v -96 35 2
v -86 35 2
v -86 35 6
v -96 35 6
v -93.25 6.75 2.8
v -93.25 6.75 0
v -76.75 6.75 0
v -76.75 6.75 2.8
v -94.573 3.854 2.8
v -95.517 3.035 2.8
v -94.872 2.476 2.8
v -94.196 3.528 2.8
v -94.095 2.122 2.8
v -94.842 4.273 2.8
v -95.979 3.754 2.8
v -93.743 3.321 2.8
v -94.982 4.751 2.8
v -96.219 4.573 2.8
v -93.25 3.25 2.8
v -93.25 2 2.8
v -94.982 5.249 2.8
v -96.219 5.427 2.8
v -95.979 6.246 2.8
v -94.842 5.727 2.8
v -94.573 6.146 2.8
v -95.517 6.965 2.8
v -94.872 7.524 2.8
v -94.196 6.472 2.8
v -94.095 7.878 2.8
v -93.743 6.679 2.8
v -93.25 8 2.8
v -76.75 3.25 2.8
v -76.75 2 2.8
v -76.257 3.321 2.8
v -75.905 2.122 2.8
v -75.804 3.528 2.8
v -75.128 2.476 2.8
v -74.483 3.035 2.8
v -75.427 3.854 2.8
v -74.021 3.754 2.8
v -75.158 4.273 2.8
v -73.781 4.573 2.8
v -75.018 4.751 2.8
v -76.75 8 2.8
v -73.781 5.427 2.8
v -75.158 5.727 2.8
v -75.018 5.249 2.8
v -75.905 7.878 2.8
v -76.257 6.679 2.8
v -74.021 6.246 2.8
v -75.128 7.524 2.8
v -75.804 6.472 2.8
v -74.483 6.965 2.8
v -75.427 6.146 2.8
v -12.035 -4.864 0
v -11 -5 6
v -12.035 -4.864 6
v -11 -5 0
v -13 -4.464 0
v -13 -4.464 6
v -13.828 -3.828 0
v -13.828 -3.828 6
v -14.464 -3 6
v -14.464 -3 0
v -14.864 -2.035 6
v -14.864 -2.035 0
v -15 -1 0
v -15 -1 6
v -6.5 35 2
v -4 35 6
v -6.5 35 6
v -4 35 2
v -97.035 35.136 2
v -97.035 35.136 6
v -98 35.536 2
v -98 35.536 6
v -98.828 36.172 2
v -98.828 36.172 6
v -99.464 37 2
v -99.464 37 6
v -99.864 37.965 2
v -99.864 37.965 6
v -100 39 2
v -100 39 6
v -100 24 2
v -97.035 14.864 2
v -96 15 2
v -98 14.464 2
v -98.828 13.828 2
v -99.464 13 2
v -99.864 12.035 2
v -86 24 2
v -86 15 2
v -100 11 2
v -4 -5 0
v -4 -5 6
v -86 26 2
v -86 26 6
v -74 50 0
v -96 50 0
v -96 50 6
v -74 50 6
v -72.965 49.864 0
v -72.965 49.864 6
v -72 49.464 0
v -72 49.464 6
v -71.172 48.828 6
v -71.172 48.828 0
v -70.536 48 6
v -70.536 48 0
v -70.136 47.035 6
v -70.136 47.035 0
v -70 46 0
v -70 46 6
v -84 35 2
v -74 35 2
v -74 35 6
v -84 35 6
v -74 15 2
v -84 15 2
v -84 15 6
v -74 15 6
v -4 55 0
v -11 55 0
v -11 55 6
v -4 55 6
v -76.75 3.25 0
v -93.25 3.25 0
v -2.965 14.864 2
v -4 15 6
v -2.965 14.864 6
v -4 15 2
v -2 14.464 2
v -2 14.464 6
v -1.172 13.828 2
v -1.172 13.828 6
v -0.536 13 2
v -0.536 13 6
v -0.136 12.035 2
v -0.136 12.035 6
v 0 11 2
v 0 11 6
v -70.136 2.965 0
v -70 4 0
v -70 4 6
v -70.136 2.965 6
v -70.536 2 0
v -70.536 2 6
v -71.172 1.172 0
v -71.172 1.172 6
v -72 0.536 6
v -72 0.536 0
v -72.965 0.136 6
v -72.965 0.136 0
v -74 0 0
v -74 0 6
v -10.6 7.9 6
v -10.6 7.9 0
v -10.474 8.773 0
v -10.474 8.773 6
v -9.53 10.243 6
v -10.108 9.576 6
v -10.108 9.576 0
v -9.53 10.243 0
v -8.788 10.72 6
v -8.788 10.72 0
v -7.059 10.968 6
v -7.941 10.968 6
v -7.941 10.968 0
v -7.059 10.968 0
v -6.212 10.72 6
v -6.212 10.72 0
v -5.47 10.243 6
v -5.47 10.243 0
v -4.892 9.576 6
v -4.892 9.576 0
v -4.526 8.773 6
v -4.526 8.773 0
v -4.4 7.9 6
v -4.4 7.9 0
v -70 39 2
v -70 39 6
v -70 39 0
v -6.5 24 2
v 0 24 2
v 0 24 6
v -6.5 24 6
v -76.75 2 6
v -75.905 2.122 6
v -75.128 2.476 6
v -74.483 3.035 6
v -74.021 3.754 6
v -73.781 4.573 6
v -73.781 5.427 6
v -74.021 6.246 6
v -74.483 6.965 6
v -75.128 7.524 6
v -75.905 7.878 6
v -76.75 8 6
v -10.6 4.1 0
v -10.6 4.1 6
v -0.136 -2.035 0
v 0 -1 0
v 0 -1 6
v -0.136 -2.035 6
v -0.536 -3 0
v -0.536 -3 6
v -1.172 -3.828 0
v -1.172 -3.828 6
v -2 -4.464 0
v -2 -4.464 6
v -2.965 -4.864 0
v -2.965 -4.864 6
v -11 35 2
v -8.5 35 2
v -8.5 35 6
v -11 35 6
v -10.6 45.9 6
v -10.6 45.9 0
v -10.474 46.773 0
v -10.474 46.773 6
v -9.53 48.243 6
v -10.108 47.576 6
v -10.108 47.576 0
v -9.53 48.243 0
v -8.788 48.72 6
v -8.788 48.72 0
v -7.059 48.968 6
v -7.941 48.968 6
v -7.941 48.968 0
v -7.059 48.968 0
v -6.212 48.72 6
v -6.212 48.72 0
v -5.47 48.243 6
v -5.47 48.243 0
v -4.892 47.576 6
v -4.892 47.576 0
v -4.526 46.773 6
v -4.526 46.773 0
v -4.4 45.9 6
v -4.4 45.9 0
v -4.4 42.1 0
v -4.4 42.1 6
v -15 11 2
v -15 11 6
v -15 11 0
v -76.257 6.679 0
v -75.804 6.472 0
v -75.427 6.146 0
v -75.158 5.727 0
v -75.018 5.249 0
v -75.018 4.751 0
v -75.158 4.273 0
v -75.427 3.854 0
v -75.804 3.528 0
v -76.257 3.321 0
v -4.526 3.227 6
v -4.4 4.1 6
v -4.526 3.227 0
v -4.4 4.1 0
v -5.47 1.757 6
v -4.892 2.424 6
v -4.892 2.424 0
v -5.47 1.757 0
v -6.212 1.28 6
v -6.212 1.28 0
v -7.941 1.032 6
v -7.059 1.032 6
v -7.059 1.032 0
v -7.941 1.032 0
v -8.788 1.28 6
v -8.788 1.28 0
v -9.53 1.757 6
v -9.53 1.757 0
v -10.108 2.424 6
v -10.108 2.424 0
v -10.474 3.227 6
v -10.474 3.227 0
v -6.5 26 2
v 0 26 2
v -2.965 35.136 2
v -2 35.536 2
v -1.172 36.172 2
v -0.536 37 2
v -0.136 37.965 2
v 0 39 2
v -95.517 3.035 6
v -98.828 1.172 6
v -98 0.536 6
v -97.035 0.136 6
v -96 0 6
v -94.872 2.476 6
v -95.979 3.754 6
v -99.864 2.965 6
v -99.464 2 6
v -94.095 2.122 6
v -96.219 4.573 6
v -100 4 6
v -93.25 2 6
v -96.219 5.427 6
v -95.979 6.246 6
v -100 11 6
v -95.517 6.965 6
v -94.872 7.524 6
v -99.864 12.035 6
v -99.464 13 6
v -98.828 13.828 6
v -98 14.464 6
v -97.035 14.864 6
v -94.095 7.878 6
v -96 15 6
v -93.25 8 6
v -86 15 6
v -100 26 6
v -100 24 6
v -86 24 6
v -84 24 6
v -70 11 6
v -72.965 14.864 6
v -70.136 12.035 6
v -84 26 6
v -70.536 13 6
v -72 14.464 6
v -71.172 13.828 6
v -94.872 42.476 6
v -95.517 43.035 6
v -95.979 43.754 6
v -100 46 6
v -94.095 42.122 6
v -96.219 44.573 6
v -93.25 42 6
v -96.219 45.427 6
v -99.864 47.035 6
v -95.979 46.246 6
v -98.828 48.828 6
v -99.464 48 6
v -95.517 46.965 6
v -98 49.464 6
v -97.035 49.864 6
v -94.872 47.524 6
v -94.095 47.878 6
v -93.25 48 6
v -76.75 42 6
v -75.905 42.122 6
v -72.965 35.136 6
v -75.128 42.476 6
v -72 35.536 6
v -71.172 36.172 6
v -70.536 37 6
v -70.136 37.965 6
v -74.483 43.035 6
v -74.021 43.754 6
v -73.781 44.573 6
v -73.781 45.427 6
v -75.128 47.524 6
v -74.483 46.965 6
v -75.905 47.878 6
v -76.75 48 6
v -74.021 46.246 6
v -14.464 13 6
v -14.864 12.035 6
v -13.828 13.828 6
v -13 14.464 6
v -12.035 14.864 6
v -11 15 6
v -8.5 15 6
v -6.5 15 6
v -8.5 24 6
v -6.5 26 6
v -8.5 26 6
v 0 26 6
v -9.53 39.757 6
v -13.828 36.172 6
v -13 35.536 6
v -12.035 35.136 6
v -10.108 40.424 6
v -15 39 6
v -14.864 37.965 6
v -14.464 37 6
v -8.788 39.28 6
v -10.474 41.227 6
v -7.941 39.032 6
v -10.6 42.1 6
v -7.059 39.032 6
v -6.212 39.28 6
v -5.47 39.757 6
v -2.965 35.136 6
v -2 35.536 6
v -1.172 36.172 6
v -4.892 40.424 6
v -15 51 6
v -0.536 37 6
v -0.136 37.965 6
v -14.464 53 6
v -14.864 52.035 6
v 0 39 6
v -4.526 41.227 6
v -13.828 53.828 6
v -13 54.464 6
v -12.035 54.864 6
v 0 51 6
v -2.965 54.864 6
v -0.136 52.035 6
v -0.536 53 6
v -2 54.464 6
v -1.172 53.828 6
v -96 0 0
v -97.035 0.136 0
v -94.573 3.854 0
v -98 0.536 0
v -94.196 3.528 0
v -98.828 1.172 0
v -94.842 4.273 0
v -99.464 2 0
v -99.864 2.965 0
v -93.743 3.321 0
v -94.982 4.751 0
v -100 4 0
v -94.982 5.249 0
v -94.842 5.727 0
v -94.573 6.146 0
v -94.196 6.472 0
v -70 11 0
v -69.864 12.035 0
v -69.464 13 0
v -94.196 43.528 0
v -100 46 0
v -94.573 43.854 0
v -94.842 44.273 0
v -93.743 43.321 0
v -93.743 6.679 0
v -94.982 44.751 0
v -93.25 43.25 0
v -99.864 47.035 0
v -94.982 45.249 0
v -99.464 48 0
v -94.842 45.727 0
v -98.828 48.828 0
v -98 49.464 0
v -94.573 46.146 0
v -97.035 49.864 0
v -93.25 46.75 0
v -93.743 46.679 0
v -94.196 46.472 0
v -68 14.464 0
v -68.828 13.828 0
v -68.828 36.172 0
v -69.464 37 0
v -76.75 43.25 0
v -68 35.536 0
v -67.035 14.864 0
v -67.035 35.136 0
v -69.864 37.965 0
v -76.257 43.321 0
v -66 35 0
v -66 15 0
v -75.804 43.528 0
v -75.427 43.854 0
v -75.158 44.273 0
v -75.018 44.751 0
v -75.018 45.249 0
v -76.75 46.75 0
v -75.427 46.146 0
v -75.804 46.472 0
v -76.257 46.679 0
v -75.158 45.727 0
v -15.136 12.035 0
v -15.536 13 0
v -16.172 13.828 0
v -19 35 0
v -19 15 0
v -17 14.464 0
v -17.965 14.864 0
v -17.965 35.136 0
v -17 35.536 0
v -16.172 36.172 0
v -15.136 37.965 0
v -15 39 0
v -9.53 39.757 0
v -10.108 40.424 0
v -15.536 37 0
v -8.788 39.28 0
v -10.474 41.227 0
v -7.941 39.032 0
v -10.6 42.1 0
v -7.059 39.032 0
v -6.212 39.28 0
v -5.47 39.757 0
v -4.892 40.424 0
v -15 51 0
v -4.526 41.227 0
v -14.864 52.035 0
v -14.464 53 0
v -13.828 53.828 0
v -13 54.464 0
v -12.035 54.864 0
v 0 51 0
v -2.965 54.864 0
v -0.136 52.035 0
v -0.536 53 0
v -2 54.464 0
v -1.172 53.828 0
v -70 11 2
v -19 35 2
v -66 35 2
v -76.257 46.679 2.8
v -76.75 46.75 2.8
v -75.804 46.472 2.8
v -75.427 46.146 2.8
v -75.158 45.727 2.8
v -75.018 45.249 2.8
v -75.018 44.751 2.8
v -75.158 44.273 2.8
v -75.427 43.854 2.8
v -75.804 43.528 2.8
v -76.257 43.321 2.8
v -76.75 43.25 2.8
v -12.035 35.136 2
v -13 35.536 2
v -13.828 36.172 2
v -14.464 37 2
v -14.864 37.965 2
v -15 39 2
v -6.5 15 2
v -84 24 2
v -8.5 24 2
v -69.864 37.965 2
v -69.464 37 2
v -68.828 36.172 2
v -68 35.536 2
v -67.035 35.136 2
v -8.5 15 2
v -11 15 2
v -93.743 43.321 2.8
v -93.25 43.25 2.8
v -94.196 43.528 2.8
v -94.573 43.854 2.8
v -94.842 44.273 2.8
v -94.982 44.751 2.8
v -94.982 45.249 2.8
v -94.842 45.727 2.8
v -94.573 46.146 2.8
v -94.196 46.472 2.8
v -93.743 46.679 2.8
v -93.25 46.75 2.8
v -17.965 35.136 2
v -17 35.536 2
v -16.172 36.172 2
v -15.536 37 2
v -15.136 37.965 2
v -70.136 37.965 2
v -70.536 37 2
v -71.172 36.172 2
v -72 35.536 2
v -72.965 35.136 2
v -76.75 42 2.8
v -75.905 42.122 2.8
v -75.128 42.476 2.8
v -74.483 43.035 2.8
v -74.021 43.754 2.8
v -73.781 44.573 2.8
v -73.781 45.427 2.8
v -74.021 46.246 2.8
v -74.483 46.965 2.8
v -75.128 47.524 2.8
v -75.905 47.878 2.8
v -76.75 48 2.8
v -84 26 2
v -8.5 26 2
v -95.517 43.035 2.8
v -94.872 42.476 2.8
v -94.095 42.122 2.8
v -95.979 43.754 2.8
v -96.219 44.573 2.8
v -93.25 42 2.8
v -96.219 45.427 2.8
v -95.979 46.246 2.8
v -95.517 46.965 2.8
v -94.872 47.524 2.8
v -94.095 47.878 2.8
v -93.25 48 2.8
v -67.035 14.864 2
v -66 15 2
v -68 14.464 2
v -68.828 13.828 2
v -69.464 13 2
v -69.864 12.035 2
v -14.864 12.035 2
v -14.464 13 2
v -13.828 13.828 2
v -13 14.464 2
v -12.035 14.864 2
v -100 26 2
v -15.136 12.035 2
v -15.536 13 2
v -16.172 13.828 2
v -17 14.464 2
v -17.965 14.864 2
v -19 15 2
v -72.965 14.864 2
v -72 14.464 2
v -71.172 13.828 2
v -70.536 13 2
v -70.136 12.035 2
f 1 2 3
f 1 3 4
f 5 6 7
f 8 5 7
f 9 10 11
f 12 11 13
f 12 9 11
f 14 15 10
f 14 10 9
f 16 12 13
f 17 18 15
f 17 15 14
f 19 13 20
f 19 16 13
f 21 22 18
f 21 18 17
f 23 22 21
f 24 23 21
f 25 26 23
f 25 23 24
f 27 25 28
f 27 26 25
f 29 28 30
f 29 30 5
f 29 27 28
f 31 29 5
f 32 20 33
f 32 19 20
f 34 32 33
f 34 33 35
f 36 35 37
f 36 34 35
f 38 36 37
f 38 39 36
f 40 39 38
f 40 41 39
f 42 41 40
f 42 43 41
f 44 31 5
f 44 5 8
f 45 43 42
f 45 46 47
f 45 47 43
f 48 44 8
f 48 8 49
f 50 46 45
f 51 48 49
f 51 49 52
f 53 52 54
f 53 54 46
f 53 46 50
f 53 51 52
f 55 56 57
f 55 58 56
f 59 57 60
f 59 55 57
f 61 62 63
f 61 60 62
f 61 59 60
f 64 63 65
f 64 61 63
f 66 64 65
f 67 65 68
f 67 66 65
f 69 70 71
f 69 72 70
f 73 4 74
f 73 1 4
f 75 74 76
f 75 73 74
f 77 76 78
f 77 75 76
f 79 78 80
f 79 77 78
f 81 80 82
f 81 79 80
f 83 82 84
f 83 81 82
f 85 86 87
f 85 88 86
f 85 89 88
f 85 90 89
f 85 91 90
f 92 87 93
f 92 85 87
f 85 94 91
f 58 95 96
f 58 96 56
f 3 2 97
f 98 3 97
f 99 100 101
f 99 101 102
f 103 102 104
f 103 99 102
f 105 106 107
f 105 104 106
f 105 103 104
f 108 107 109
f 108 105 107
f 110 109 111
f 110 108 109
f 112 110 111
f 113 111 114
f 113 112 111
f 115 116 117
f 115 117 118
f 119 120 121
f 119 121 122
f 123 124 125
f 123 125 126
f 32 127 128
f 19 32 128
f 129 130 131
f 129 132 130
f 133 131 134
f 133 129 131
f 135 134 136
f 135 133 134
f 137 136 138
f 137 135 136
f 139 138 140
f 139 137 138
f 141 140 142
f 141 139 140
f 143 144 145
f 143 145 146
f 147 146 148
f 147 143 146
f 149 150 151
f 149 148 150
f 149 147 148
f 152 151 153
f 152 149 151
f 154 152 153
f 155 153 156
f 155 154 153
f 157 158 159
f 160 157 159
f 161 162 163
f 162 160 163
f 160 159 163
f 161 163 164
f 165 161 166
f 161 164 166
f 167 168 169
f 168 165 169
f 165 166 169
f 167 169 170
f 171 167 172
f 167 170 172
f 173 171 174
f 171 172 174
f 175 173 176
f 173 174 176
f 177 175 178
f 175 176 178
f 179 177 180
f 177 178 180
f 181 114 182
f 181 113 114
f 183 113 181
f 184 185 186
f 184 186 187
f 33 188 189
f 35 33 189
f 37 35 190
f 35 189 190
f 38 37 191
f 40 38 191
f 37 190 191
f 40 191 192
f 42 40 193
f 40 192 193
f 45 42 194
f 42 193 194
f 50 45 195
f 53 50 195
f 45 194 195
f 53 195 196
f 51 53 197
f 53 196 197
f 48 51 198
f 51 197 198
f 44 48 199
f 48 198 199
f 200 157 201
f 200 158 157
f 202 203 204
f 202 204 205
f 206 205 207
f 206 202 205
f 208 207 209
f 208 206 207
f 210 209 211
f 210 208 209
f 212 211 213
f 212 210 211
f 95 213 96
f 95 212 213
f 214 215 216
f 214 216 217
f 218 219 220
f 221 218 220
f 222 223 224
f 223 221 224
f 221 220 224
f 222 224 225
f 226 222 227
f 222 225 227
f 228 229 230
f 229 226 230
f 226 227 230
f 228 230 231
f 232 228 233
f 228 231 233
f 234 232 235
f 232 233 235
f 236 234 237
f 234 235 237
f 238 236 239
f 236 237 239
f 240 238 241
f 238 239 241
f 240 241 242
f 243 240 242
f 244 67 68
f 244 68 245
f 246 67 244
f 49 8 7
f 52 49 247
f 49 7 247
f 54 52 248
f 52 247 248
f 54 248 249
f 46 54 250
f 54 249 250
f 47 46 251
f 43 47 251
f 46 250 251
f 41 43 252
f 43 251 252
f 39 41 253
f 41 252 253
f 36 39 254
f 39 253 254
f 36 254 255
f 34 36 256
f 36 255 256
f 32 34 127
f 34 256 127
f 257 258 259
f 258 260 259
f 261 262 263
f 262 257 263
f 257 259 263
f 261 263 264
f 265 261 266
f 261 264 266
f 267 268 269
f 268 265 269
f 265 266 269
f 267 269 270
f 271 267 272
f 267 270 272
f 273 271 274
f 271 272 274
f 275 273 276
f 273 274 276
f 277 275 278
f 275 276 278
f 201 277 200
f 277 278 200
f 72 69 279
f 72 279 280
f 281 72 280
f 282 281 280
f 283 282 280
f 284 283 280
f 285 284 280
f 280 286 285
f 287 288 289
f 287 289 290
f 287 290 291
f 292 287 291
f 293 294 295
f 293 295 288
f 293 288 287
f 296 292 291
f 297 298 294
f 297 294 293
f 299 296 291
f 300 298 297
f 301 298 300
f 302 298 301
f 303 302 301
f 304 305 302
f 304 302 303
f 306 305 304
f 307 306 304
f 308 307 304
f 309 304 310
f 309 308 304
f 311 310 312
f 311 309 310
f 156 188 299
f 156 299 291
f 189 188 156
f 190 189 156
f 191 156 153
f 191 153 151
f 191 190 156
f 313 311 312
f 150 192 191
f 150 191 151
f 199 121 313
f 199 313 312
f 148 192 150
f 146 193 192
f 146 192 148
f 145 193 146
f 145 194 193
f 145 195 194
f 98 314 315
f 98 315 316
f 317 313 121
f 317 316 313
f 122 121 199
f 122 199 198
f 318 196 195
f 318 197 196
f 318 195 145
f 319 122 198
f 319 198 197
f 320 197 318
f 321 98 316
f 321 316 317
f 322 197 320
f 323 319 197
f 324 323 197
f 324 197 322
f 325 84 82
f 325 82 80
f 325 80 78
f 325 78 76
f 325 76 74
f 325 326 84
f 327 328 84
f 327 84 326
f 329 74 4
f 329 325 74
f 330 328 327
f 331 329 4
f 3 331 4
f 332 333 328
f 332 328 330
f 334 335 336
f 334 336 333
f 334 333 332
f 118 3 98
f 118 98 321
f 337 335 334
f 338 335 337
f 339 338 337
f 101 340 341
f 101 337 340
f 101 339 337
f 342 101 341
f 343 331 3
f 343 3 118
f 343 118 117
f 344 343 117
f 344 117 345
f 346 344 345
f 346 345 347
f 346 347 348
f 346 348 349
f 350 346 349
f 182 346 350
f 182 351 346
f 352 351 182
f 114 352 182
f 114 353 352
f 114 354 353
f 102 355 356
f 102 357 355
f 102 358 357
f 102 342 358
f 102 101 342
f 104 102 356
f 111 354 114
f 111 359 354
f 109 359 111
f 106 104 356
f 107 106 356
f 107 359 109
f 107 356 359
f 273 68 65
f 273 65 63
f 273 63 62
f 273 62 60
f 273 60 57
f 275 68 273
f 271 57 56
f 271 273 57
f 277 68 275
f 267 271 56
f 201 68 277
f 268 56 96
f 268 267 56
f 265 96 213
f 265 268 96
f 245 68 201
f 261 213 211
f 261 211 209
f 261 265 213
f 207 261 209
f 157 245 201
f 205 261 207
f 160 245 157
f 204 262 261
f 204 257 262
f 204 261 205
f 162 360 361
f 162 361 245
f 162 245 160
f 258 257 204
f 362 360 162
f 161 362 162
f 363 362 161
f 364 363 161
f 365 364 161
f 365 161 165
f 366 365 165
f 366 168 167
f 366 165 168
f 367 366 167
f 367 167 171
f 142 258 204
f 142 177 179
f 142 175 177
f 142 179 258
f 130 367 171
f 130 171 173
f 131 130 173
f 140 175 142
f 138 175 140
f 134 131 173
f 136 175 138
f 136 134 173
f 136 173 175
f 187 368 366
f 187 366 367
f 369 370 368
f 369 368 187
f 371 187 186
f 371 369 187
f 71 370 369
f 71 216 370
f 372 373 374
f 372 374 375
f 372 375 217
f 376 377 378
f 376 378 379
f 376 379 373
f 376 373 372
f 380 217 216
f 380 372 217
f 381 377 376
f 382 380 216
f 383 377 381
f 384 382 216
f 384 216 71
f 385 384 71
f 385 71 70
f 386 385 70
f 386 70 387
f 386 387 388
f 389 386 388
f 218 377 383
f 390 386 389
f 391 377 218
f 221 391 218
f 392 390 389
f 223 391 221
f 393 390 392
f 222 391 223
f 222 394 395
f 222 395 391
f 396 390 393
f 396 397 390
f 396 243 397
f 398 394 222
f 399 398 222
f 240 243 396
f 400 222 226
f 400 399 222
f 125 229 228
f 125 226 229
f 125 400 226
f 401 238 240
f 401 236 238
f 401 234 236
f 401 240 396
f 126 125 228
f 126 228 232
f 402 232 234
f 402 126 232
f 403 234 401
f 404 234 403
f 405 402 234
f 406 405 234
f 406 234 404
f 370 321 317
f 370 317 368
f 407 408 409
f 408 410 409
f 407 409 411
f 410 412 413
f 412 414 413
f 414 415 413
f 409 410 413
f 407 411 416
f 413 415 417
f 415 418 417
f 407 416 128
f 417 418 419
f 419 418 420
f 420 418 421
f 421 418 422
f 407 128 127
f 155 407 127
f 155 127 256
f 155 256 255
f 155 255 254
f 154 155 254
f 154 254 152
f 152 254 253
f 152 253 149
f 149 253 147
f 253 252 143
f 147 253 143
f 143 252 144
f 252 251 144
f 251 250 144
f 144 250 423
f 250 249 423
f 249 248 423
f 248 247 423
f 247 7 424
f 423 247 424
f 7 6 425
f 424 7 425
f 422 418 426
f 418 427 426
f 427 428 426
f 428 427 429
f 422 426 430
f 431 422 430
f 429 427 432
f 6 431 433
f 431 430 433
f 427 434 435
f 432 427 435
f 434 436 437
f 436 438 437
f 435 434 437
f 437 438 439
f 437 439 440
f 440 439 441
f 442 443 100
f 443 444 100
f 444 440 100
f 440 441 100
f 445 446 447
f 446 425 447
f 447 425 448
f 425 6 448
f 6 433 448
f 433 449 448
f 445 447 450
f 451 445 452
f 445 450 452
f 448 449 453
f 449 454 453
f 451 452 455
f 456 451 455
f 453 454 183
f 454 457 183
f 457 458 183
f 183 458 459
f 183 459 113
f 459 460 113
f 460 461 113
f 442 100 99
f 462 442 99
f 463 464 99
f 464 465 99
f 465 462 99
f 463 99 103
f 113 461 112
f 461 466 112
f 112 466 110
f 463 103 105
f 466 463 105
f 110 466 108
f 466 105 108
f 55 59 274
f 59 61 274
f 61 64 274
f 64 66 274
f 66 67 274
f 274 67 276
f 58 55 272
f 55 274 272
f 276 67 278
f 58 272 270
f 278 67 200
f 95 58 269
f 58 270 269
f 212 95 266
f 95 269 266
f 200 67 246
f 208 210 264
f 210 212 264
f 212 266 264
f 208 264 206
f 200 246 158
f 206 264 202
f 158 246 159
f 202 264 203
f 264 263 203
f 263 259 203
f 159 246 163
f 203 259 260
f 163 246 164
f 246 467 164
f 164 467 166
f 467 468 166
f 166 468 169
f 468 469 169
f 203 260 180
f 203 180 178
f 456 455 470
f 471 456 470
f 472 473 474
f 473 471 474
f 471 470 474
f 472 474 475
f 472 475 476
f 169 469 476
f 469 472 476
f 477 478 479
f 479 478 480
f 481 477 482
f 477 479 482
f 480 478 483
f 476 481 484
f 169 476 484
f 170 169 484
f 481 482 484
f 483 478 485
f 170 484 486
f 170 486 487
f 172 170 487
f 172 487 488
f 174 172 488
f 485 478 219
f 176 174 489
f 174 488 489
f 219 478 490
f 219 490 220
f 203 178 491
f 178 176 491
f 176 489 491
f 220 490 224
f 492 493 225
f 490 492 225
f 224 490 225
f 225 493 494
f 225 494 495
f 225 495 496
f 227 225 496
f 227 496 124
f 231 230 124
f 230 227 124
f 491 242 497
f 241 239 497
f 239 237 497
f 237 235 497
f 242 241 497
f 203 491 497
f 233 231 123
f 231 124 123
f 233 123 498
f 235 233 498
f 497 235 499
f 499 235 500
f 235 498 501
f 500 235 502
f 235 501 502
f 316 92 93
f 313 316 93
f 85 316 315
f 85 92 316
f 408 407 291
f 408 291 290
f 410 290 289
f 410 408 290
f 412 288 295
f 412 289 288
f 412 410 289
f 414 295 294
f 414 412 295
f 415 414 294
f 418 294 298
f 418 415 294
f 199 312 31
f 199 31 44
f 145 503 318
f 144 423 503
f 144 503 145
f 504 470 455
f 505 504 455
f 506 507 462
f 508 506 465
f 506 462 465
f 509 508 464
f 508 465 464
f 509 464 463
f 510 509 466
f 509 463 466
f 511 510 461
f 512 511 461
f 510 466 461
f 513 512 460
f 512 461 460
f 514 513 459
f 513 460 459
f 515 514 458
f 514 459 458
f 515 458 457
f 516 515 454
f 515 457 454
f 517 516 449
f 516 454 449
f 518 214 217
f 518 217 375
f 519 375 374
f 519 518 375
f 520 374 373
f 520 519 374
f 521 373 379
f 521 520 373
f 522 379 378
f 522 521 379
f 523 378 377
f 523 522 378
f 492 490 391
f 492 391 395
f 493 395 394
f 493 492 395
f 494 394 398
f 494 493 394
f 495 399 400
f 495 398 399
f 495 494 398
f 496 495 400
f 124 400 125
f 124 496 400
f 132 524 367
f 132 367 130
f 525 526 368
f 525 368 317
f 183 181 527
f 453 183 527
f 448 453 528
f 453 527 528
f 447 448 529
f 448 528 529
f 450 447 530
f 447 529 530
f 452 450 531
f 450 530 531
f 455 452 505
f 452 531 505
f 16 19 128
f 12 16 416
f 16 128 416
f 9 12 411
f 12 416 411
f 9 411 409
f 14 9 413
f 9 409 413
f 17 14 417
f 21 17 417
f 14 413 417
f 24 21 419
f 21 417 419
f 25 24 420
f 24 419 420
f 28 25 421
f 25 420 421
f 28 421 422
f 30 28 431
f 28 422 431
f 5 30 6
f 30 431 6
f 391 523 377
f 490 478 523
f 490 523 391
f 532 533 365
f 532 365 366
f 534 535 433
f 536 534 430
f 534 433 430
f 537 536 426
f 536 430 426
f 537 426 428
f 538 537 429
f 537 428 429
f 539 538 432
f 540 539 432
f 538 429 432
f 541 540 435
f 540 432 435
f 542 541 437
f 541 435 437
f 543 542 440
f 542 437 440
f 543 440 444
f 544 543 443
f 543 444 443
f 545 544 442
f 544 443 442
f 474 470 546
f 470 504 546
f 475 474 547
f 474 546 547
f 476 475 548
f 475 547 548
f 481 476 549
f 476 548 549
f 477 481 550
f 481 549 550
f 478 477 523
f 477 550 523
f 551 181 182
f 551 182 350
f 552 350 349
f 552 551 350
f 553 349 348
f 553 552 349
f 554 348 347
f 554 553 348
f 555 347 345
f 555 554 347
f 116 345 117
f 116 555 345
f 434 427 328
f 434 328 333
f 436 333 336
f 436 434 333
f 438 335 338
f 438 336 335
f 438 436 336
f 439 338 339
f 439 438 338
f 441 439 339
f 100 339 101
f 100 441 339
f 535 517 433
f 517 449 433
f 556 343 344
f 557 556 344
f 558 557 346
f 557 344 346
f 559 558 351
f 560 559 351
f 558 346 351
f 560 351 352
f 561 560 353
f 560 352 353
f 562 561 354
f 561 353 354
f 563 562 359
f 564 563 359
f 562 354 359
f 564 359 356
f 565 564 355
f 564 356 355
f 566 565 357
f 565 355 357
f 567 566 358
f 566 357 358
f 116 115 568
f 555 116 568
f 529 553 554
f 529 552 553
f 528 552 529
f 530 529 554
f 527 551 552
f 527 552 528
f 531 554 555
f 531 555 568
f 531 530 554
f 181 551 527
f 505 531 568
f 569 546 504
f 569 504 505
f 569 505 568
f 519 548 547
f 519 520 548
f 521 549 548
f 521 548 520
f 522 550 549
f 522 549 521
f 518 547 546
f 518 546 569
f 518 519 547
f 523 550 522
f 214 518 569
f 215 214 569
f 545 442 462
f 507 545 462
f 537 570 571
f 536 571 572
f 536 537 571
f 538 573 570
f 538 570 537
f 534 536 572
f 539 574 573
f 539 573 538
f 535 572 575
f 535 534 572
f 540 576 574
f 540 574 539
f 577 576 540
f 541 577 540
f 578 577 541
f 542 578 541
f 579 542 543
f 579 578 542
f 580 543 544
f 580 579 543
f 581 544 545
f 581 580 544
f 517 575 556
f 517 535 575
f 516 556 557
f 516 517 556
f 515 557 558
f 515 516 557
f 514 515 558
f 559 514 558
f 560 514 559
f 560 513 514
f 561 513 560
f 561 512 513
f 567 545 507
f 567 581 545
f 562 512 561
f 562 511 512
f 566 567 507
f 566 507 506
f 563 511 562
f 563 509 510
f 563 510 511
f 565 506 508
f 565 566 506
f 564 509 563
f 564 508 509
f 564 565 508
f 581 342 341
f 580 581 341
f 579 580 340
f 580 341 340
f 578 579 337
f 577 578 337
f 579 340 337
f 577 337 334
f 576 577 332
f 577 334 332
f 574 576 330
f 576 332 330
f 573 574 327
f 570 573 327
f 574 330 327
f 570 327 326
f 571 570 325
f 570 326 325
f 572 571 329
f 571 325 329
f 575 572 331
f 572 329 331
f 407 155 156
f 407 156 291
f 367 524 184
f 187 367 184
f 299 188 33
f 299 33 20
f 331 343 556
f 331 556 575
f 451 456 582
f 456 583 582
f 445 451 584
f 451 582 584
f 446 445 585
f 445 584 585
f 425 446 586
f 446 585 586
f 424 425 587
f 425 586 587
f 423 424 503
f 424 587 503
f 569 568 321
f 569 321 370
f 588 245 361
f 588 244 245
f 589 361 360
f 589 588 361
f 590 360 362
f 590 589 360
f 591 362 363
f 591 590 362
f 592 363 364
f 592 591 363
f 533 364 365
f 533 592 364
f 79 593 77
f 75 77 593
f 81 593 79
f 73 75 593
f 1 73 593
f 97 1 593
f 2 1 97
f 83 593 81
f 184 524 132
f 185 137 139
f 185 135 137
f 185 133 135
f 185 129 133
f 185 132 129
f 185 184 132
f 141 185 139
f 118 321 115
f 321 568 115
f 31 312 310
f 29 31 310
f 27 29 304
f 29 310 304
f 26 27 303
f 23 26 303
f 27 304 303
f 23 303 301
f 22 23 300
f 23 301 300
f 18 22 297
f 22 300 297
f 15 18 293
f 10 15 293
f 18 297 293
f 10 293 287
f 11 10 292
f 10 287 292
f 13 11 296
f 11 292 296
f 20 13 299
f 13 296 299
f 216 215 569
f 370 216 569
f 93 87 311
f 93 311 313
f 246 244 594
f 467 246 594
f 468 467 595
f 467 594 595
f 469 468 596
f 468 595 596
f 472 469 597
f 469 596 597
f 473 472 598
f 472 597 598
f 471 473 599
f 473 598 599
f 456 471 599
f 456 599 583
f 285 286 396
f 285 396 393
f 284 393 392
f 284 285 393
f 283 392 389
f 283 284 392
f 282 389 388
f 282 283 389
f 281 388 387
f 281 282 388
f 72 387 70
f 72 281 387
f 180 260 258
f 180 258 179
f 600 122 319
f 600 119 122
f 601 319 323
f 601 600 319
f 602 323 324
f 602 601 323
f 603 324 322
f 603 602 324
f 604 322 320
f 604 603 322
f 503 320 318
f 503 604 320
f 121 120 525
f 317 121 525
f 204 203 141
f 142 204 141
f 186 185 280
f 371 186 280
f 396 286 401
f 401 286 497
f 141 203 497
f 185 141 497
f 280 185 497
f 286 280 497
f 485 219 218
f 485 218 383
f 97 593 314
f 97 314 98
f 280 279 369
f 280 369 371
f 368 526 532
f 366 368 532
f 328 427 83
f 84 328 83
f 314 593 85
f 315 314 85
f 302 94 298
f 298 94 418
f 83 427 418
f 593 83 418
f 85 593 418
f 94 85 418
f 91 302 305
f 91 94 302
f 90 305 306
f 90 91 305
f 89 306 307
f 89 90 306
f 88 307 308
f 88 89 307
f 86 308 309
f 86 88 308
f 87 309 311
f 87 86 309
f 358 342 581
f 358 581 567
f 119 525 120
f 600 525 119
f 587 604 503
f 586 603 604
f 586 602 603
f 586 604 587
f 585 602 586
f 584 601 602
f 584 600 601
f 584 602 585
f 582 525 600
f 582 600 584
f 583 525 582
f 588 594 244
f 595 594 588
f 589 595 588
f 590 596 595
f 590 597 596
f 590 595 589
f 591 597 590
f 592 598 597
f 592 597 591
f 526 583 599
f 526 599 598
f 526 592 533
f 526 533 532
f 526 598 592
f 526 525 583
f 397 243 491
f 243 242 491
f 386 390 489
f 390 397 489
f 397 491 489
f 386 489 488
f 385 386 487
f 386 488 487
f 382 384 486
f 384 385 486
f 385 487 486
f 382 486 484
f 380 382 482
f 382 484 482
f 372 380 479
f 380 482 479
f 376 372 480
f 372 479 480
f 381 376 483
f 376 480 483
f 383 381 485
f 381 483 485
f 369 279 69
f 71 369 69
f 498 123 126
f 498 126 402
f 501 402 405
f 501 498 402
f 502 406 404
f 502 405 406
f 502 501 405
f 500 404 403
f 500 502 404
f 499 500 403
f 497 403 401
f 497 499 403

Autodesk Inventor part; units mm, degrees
ref_plane "YZ Plane" through (0, 0, 0) normal (1, 0, 0) x (0, 1, 0)
ref_plane "XZ Plane" through (0, 0, 0) normal (0, 1, 0) x (-1, 0, 0)
ref_plane "XY Plane" through (0, 0, 0) normal (0, 0, 1) x (1, 0, 0)
sketch "Sketch1" plane through (0, 0, 0) normal (0, 0, 1) x (1, 0, 0)
  line L0 (0, 0) -> (-100, 0)
  line L1 (-100, 0) -> (-100, 50)
  line L2 (-100, 50) -> (0, 50)
  line L3 (0, 50) -> (0, 0)
  line L4 (-93.25, 46.75) -> (-76.75, 46.75)
  line L5 (-75, 45) -> (-75, 45)
  line L6 (-76.75, 43.25) -> (-93.25, 43.25)
  line L7 (-95, 45) -> (-95, 45)
  line L8 (-93.25, 6.75) -> (-76.75, 6.75)
  line L9 (-75, 5) -> (-75, 5)
  line L10 (-76.75, 3.25) -> (-93.25, 3.25)
  line L11 (-95, 5) -> (-95, 5)
  arc A0 (-93.25, 46.75) -> (-95, 45) centre (-93.25, 45) ccw
  arc A1 (-95, 45) -> (-93.25, 43.25) centre (-93.25, 45) ccw
  arc A2 (-75, 45) -> (-76.75, 46.75) centre (-76.75, 45) ccw
  arc A3 (-76.75, 43.25) -> (-75, 45) centre (-76.75, 45) ccw
  arc A4 (-75, 5) -> (-76.75, 6.75) centre (-76.75, 5) ccw
  arc A5 (-93.25, 6.75) -> (-95, 5) centre (-93.25, 5) ccw
  arc A6 (-95, 5) -> (-93.25, 3.25) centre (-93.25, 5) ccw
  arc A7 (-76.75, 3.25) -> (-75, 5) centre (-76.75, 5) ccw
  line L12 (0, 55) -> (-15, 55)
  line L13 (-15, 55) -> (-15, -5)
  line L14 (-15, -5) -> (0, -5)
  line L15 (0, -5) -> (0, 55)
  line L16 (-70, 50) -> (-15, 50)
  line L17 (-15, 50) -> (-15, 35)
  line L18 (-15, 35) -> (-70, 35)
  line L19 (-70, 35) -> (-70, 50)
  line L20 (-70, 0) -> (-15, 0)
  line L21 (-15, 0) -> (-15, 15)
  line L22 (-15, 15) -> (-70, 15)
  line L23 (-70, 15) -> (-70, 0)
  point P0 (-75, 43.25)
  point P1 (-75, 46.75)
  point P2 (-95, 43.25)
  point P3 (-95, 6.75)
  point P4 (-75, 3.25)
  point P5 (-75, 6.75)
  dimension "d0" = 100
  dimension "d1" = 50
  dimension "d2" = 20
  dimension "d3" = 3.5
  dimension "d4" = 3.5
  dimension "d5" = 36.5
  dimension "d6" = 3.25
  dimension "d7" = 5
  dimension "d8" = 1.75
  dimension "d11" = 15
  dimension "d12" = 60
  dimension "d13" = 15
  dimension "d14" = 15
  dimension "d17" = 55
  dimension "d18" = 15
  dimension "d19" = 5
extrude "Extrusion1" add sketch "Sketch1" along normal blind 2 contours L15 L14 L13 L0 | L0 L13 L2 L3 | L2 L13 L12 L15 | L0 L1 L2 L19 L18 L13 L22 L23
fillet "Fillet1" radius 4 12 edges at (-70, 50, 1) (-70, 35, 1) (-100, 50, 1) (-100, 0, 1) (-70, 0, 1) (-70, 15, 1) (-15, 15, 1) (-15, 35, 1) (-15, 55, 1) (0, 55, 1) (0, -5, 1) (-15, -5, 1)
sketch "Sketch2" plane through (0, 0, 2) normal (0, 0, 1) x (1, 0, 0)
  line L0 (-7.5, 49) -> (-7.5, 49)
  line L1 (-4.4, 45.9) -> (-4.4, 42.1)
  line L2 (-7.5, 39) -> (-7.5, 39)
  line L3 (-10.6, 42.1) -> (-10.6, 45.9)
  line L4 (-7.5, 11) -> (-7.5, 11)
  line L5 (-4.4, 7.9) -> (-4.4, 4.1)
  line L6 (-7.5, 1) -> (-7.5, 1)
  line L7 (-10.6, 4.1) -> (-10.6, 7.9)
  line L8 (0, -1) -> (0, 51) projected
  line L9 (-4, 55) -> (-11, 55) projected
  line L10 (-11, -5) -> (-4, -5) projected
  arc A0 (-7.5, 49) -> (-10.6, 45.9) centre (-7.5, 45.9) ccw
  arc A1 (-4.4, 45.9) -> (-7.5, 49) centre (-7.5, 45.9) ccw
  arc A2 (-7.5, 39) -> (-4.4, 42.1) centre (-7.5, 42.1) ccw
  arc A3 (-10.6, 42.1) -> (-7.5, 39) centre (-7.5, 42.1) ccw
  arc A4 (-7.5, 11) -> (-10.6, 7.9) centre (-7.5, 7.9) ccw
  arc A5 (-7.5, 1) -> (-4.4, 4.1) centre (-7.5, 4.1) ccw
  arc A6 (-4.4, 7.9) -> (-7.5, 11) centre (-7.5, 7.9) ccw
  arc A7 (-10.6, 4.1) -> (-7.5, 1) centre (-7.5, 4.1) ccw
  point P0 (0, 0)
  point P1 (-4.4, 39)
  point P2 (-4.4, 49)
  point P3 (-10.6, 39)
  point P4 (-4.4, 1)
  point P5 (-4.4, 11)
  point P6 (-10.6, 1)
  point P7 (-7.5, 49)
  point P8 (-7.5, 1)
  point P9 (-7.5, 1)
  dimension "d21" = 6.2
  dimension "d22" = 10
  dimension "d23" = 6.2
  dimension "d24" = 10
  dimension "d25" = 4.4
  dimension "d26" = 4.4
  dimension "d27" = 6
  dimension "d28" = 6
  dimension "d29" = 3.1
extrude "Extrusion2" cut sketch "Sketch2" against normal blind 2
sketch "Sketch3" plane through (0, 0, 2) normal (0, 0, 1) x (1, 0, 0)
  line L0 (0, -1) -> (0, 51) projected
  line L1 (-100, 24) -> (-100, 26)
  line L2 (0, 26) -> (0, 24)
  line L3 (-11, 55) -> (-4, 55)
  line L4 (0, 51) -> (0, 39)
  line L5 (-15, 39) -> (-15, 51)
  line L6 (-4, -5) -> (-11, -5)
  line L7 (-15, -1) -> (-15, 11)
  line L8 (0, 11) -> (0, -1)
  line L9 (-96, 50) -> (-74, 50)
  line L10 (-70, 46) -> (-70, 39)
  line L11 (-100, 39) -> (-100, 46)
  line L12 (-100, 46) -> (-100, 4) projected
  line L13 (-74, 0) -> (-96, 0)
  line L14 (-100, 4) -> (-100, 11)
  line L15 (-70, 11) -> (-70, 4)
  arc A0 (-96, 50) -> (-100, 46) centre (-96, 46) ccw
  arc A1 (-70, 46) -> (-74, 50) centre (-74, 46) ccw
  arc A2 (-100, 39) -> (-96, 35) centre (-96, 39) ccw
  arc A3 (-74, 35) -> (-70, 39) centre (-74, 39) ccw
  arc A4 (-96, 15) -> (-100, 11) centre (-96, 11) ccw
  arc A5 (-100, 4) -> (-96, 0) centre (-96, 4) ccw
  arc A6 (-74, 0) -> (-70, 4) centre (-74, 4) ccw
  arc A7 (-70, 11) -> (-74, 15) centre (-74, 11) ccw
  arc A8 (-11, 15) -> (-15, 11) centre (-11, 11) ccw
  arc A9 (0, 11) -> (-4, 15) centre (-4, 11) ccw
  arc A10 (-4, -5) -> (0, -1) centre (-4, -1) ccw
  arc A11 (-15, -1) -> (-11, -5) centre (-11, -1) ccw
  arc A12 (-15, 39) -> (-11, 35) centre (-11, 39) ccw
  arc A13 (-4, 35) -> (0, 39) centre (-4, 39) ccw
  arc A14 (0, 51) -> (-4, 55) centre (-4, 51) ccw
  arc A15 (-11, 55) -> (-15, 51) centre (-11, 51) ccw
  line L16 (-100, 26) -> (-86, 26)
  line L17 (-86, 35) -> (-86, 26)
  line L18 (-86, 24) -> (-86, 15)
  line L19 (-86, 24) -> (-100, 24)
  line L20 (-84, 15) -> (-84, 24)
  line L21 (-84, 26) -> (-84, 35)
  line L22 (-96, 15) -> (-86, 15)
  line L23 (-84, 15) -> (-74, 15)
  line L24 (-74, 35) -> (-84, 35)
  line L25 (-86, 35) -> (-96, 35)
  line L26 (-4, 35) -> (-6.5, 35)
  line L27 (-8.5, 35) -> (-11, 35)
  line L28 (-84, 26) -> (-8.5, 26)
  line L29 (-6.5, 26) -> (0, 26)
  line L30 (-8.5, 35) -> (-8.5, 26)
  line L31 (-8.5, 24) -> (-8.5, 15)
  line L32 (-6.5, 15) -> (-6.5, 24)
  line L33 (-6.5, 26) -> (-6.5, 35)
  line L34 (0, 24) -> (-6.5, 24)
  line L35 (-8.5, 24) -> (-84, 24)
  line L36 (-11, 15) -> (-8.5, 15)
  line L37 (-6.5, 15) -> (-4, 15)
  line L38 (-10.6, 45.9) -> (-10.6, 42.1) projected
  line L39 (-10.6, 45.9) -> (-10.6, 42.1)
  arc A16 (-10.6, 42.1) -> (-4.4, 42.1) centre (-7.5, 42.1) ccw projected
  arc A17 (-10.6, 42.1) -> (-4.4, 42.1) centre (-7.5, 42.1) ccw
  arc A18 (-4.4, 45.9) -> (-10.6, 45.9) centre (-7.5, 45.9) ccw projected
  arc A19 (-4.4, 45.9) -> (-10.6, 45.9) centre (-7.5, 45.9) ccw
  line L40 (-4.4, 45.9) -> (-4.4, 42.1)
  arc A20 (-4.4, 7.9) -> (-10.6, 7.9) centre (-7.5, 7.9) ccw projected
  arc A21 (-4.4, 7.9) -> (-10.6, 7.9) centre (-7.5, 7.9) ccw
  arc A22 (-10.6, 4.1) -> (-4.4, 4.1) centre (-7.5, 4.1) ccw projected
  arc A23 (-10.6, 4.1) -> (-4.4, 4.1) centre (-7.5, 4.1) ccw
  line L41 (-10.6, 7.9) -> (-10.6, 4.1) projected
  line L42 (-10.6, 7.9) -> (-10.6, 4.1)
  line L43 (-4.4, 4.1) -> (-4.4, 7.9) projected
  line L44 (-4.4, 4.1) -> (-4.4, 7.9)
  arc A24 (-93.25, 46.75) -> (-93.25, 43.25) centre (-93.25, 45) ccw projected
  line L45 (-93.25, 46.75) -> (-76.75, 46.75) projected
  line L46 (-93.25, 46.75) -> (-76.75, 46.75)
  arc A25 (-93.25, 46.75) -> (-93.25, 43.25) centre (-93.25, 45) ccw
  arc A26 (-76.75, 43.25) -> (-76.75, 46.75) centre (-76.75, 45) ccw
  line L47 (-76.75, 43.25) -> (-93.25, 43.25) projected
  line L48 (-93.25, 43.25) -> (-76.75, 43.25)
  arc A27 (-93.25, 6.75) -> (-93.25, 3.25) centre (-93.25, 5) ccw projected
  line L49 (-93.25, 6.75) -> (-76.75, 6.75)
  arc A28 (-76.75, 3.25) -> (-76.75, 6.75) centre (-76.75, 5) ccw projected
  arc A29 (-76.75, 3.25) -> (-76.75, 6.75) centre (-76.75, 5) ccw
  line L50 (-76.75, 3.25) -> (-93.25, 3.25)
  point P0 (0, 0)
  point P1 (0, 25)
  point P2 (0, 35)
  point P3 (0, 55)
  point P4 (0, -5)
  point P5 (-15, 15)
  point P6 (-15, -5)
  point P7 (-70, 35)
  point P8 (-100, 35)
  point P9 (-70, 0)
  point P10 (-100, 15)
  point P11 (-85, 35)
  point P12 (-7.5, 35)
  dimension "d32" = 100
  dimension "d33" = 2
  dimension "d35" = 20
  dimension "d36" = 20
  dimension "d37" = 4
extrude "Extrusion3" add sketch "Sketch3" along normal blind 4 contours A10 L6 A11 L7 A8 L36 L31 L35 L20 L23 A7 L15 A6 L13 A5 L12 A4 L22 L18 L19 L1 L16 L17 L25 A2 L11 A0 L9 A1 L10 A3 L24 L21 L28 L30 L27 A12 L5 A15 L3 A14 L0 A13 L26 L33 L29 L34 L32 L37 A9
sketch "Sketch5" plane through (0, 0, 6) normal (0, 0, 1) x (1, 0, 0)
  line L0 (-93.25, 6.75) -> (-76.75, 6.75) projected
  arc A0 (-76.75, 3.25) -> (-76.75, 6.75) centre (-76.75, 5) ccw projected
  arc A1 (-93.25, 6.75) -> (-93.25, 3.25) centre (-93.25, 5) ccw projected
  line L1 (-76.75, 3.25) -> (-93.25, 3.25) projected
  arc A2 (-76.75, 2) -> (-76.75, 8) centre (-76.75, 5) ccw
  arc A3 (-93.25, 8) -> (-93.25, 2) centre (-93.25, 5) ccw
  line L2 (-76.75, 2) -> (-93.25, 2)
  line L3 (-93.25, 8) -> (-76.75, 8)
  line L4 (-70, 0) -> (-70, 7.5)
  line L5 (-70, 4) -> (-70, 11) projected
  arc A4 (-76.75, 42) -> (-76.75, 48) centre (-76.75, 45) ccw
  arc A5 (-93.25, 48) -> (-93.25, 42) centre (-93.25, 45) ccw
  line L6 (-76.75, 42) -> (-93.25, 42)
  line L7 (-93.25, 48) -> (-76.75, 48)
  point P0 (-75, 5)
  point P1 (-75, 45)
  dimension "d68" = 6
  dimension "d69" = 6
  dimension "d72" = 40
extrude "Extrusion4" cut sketch "Sketch5" against normal blind 3.2 contours L0 A0 L1 A1 | L2 A3 L3 A2 | L6 A5 L7 A4
equation "\"d26\" = d25"
properties part number "panel_holder"
